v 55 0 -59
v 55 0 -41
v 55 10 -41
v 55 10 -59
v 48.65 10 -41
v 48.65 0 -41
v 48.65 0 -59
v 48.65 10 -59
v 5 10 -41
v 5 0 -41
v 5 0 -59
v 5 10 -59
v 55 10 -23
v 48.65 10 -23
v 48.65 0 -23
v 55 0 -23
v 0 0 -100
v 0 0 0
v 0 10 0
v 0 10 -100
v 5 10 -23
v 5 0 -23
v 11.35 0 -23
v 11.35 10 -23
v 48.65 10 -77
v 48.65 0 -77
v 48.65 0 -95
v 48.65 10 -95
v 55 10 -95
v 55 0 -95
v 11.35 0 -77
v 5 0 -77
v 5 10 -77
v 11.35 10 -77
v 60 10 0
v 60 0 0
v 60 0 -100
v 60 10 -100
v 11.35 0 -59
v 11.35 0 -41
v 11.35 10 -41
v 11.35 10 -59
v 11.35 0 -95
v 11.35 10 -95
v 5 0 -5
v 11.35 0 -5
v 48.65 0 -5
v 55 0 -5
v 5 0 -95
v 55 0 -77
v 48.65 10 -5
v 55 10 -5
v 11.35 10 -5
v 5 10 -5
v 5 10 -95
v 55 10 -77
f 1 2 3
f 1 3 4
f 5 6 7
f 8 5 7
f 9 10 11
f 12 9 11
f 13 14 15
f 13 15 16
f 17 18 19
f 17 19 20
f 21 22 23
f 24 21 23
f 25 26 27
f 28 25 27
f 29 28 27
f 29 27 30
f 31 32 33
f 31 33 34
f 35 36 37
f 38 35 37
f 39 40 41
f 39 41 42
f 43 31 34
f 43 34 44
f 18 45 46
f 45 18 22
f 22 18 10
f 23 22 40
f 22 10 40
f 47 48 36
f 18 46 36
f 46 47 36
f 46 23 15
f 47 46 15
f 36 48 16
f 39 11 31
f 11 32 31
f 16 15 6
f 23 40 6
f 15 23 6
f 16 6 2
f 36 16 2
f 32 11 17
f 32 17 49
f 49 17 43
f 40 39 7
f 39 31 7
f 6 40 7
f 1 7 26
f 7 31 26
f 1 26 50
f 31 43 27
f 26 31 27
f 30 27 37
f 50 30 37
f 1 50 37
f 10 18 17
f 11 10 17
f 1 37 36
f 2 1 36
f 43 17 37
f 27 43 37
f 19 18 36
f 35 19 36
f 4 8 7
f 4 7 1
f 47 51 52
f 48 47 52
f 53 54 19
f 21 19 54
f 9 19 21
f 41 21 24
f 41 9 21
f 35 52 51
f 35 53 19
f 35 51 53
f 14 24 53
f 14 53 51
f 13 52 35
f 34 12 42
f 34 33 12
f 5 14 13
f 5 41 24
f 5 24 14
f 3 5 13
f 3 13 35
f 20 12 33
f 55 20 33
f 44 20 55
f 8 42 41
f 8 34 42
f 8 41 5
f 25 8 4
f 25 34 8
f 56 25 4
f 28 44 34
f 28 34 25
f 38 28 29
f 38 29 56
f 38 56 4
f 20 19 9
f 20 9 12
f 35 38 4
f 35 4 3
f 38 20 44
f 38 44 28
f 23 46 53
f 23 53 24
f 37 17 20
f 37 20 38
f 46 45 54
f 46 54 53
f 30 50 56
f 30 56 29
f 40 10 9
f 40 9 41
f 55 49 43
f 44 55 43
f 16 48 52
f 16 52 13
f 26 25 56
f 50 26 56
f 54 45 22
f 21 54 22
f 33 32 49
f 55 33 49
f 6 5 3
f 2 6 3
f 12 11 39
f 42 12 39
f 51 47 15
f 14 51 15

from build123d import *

# Parameters (mm, degrees)
SKETCH2_W           = 60
SKETCH2_H           = 100
BOSS_EXTRUDE1_DEPTH = 10
SKETCH1_W           = 6.35
SKETCH1_H           = 18
CUT_EXTRUDE1_DEPTH  = 10


with BuildPart() as part:
    # Sketch2 → Boss-Extrude1 (new body)
    with BuildSketch(Plane(origin=(0, 0, 0), x_dir=(1, 0, 0), z_dir=(0, 1, 0))):
        with Locations((30, 50)):
            Rectangle(SKETCH2_W, SKETCH2_H)
    extrude(amount=BOSS_EXTRUDE1_DEPTH)

    # Sketch1 → Cut-Extrude1 (cut)
    with BuildSketch(Plane(origin=(0, 0, 0), x_dir=(1, 0, 0), z_dir=(0, 1, 0))):
        with Locations((8.175, 14)):
            Rectangle(SKETCH1_W, SKETCH1_H)
        with Locations((8.175, 50)):
            Rectangle(SKETCH1_W, SKETCH1_H)
        with Locations((8.175, 86)):
            Rectangle(SKETCH1_W, SKETCH1_H)
        with Locations((51.825, 86)):
            Rectangle(SKETCH1_W, SKETCH1_H)
        with Locations((51.825, 50)):
            Rectangle(SKETCH1_W, SKETCH1_H)
        with Locations((51.825, 14)):
            Rectangle(SKETCH1_W, SKETCH1_H)
    extrude(amount=CUT_EXTRUDE1_DEPTH, mode=Mode.SUBTRACT)


solid = part.part
